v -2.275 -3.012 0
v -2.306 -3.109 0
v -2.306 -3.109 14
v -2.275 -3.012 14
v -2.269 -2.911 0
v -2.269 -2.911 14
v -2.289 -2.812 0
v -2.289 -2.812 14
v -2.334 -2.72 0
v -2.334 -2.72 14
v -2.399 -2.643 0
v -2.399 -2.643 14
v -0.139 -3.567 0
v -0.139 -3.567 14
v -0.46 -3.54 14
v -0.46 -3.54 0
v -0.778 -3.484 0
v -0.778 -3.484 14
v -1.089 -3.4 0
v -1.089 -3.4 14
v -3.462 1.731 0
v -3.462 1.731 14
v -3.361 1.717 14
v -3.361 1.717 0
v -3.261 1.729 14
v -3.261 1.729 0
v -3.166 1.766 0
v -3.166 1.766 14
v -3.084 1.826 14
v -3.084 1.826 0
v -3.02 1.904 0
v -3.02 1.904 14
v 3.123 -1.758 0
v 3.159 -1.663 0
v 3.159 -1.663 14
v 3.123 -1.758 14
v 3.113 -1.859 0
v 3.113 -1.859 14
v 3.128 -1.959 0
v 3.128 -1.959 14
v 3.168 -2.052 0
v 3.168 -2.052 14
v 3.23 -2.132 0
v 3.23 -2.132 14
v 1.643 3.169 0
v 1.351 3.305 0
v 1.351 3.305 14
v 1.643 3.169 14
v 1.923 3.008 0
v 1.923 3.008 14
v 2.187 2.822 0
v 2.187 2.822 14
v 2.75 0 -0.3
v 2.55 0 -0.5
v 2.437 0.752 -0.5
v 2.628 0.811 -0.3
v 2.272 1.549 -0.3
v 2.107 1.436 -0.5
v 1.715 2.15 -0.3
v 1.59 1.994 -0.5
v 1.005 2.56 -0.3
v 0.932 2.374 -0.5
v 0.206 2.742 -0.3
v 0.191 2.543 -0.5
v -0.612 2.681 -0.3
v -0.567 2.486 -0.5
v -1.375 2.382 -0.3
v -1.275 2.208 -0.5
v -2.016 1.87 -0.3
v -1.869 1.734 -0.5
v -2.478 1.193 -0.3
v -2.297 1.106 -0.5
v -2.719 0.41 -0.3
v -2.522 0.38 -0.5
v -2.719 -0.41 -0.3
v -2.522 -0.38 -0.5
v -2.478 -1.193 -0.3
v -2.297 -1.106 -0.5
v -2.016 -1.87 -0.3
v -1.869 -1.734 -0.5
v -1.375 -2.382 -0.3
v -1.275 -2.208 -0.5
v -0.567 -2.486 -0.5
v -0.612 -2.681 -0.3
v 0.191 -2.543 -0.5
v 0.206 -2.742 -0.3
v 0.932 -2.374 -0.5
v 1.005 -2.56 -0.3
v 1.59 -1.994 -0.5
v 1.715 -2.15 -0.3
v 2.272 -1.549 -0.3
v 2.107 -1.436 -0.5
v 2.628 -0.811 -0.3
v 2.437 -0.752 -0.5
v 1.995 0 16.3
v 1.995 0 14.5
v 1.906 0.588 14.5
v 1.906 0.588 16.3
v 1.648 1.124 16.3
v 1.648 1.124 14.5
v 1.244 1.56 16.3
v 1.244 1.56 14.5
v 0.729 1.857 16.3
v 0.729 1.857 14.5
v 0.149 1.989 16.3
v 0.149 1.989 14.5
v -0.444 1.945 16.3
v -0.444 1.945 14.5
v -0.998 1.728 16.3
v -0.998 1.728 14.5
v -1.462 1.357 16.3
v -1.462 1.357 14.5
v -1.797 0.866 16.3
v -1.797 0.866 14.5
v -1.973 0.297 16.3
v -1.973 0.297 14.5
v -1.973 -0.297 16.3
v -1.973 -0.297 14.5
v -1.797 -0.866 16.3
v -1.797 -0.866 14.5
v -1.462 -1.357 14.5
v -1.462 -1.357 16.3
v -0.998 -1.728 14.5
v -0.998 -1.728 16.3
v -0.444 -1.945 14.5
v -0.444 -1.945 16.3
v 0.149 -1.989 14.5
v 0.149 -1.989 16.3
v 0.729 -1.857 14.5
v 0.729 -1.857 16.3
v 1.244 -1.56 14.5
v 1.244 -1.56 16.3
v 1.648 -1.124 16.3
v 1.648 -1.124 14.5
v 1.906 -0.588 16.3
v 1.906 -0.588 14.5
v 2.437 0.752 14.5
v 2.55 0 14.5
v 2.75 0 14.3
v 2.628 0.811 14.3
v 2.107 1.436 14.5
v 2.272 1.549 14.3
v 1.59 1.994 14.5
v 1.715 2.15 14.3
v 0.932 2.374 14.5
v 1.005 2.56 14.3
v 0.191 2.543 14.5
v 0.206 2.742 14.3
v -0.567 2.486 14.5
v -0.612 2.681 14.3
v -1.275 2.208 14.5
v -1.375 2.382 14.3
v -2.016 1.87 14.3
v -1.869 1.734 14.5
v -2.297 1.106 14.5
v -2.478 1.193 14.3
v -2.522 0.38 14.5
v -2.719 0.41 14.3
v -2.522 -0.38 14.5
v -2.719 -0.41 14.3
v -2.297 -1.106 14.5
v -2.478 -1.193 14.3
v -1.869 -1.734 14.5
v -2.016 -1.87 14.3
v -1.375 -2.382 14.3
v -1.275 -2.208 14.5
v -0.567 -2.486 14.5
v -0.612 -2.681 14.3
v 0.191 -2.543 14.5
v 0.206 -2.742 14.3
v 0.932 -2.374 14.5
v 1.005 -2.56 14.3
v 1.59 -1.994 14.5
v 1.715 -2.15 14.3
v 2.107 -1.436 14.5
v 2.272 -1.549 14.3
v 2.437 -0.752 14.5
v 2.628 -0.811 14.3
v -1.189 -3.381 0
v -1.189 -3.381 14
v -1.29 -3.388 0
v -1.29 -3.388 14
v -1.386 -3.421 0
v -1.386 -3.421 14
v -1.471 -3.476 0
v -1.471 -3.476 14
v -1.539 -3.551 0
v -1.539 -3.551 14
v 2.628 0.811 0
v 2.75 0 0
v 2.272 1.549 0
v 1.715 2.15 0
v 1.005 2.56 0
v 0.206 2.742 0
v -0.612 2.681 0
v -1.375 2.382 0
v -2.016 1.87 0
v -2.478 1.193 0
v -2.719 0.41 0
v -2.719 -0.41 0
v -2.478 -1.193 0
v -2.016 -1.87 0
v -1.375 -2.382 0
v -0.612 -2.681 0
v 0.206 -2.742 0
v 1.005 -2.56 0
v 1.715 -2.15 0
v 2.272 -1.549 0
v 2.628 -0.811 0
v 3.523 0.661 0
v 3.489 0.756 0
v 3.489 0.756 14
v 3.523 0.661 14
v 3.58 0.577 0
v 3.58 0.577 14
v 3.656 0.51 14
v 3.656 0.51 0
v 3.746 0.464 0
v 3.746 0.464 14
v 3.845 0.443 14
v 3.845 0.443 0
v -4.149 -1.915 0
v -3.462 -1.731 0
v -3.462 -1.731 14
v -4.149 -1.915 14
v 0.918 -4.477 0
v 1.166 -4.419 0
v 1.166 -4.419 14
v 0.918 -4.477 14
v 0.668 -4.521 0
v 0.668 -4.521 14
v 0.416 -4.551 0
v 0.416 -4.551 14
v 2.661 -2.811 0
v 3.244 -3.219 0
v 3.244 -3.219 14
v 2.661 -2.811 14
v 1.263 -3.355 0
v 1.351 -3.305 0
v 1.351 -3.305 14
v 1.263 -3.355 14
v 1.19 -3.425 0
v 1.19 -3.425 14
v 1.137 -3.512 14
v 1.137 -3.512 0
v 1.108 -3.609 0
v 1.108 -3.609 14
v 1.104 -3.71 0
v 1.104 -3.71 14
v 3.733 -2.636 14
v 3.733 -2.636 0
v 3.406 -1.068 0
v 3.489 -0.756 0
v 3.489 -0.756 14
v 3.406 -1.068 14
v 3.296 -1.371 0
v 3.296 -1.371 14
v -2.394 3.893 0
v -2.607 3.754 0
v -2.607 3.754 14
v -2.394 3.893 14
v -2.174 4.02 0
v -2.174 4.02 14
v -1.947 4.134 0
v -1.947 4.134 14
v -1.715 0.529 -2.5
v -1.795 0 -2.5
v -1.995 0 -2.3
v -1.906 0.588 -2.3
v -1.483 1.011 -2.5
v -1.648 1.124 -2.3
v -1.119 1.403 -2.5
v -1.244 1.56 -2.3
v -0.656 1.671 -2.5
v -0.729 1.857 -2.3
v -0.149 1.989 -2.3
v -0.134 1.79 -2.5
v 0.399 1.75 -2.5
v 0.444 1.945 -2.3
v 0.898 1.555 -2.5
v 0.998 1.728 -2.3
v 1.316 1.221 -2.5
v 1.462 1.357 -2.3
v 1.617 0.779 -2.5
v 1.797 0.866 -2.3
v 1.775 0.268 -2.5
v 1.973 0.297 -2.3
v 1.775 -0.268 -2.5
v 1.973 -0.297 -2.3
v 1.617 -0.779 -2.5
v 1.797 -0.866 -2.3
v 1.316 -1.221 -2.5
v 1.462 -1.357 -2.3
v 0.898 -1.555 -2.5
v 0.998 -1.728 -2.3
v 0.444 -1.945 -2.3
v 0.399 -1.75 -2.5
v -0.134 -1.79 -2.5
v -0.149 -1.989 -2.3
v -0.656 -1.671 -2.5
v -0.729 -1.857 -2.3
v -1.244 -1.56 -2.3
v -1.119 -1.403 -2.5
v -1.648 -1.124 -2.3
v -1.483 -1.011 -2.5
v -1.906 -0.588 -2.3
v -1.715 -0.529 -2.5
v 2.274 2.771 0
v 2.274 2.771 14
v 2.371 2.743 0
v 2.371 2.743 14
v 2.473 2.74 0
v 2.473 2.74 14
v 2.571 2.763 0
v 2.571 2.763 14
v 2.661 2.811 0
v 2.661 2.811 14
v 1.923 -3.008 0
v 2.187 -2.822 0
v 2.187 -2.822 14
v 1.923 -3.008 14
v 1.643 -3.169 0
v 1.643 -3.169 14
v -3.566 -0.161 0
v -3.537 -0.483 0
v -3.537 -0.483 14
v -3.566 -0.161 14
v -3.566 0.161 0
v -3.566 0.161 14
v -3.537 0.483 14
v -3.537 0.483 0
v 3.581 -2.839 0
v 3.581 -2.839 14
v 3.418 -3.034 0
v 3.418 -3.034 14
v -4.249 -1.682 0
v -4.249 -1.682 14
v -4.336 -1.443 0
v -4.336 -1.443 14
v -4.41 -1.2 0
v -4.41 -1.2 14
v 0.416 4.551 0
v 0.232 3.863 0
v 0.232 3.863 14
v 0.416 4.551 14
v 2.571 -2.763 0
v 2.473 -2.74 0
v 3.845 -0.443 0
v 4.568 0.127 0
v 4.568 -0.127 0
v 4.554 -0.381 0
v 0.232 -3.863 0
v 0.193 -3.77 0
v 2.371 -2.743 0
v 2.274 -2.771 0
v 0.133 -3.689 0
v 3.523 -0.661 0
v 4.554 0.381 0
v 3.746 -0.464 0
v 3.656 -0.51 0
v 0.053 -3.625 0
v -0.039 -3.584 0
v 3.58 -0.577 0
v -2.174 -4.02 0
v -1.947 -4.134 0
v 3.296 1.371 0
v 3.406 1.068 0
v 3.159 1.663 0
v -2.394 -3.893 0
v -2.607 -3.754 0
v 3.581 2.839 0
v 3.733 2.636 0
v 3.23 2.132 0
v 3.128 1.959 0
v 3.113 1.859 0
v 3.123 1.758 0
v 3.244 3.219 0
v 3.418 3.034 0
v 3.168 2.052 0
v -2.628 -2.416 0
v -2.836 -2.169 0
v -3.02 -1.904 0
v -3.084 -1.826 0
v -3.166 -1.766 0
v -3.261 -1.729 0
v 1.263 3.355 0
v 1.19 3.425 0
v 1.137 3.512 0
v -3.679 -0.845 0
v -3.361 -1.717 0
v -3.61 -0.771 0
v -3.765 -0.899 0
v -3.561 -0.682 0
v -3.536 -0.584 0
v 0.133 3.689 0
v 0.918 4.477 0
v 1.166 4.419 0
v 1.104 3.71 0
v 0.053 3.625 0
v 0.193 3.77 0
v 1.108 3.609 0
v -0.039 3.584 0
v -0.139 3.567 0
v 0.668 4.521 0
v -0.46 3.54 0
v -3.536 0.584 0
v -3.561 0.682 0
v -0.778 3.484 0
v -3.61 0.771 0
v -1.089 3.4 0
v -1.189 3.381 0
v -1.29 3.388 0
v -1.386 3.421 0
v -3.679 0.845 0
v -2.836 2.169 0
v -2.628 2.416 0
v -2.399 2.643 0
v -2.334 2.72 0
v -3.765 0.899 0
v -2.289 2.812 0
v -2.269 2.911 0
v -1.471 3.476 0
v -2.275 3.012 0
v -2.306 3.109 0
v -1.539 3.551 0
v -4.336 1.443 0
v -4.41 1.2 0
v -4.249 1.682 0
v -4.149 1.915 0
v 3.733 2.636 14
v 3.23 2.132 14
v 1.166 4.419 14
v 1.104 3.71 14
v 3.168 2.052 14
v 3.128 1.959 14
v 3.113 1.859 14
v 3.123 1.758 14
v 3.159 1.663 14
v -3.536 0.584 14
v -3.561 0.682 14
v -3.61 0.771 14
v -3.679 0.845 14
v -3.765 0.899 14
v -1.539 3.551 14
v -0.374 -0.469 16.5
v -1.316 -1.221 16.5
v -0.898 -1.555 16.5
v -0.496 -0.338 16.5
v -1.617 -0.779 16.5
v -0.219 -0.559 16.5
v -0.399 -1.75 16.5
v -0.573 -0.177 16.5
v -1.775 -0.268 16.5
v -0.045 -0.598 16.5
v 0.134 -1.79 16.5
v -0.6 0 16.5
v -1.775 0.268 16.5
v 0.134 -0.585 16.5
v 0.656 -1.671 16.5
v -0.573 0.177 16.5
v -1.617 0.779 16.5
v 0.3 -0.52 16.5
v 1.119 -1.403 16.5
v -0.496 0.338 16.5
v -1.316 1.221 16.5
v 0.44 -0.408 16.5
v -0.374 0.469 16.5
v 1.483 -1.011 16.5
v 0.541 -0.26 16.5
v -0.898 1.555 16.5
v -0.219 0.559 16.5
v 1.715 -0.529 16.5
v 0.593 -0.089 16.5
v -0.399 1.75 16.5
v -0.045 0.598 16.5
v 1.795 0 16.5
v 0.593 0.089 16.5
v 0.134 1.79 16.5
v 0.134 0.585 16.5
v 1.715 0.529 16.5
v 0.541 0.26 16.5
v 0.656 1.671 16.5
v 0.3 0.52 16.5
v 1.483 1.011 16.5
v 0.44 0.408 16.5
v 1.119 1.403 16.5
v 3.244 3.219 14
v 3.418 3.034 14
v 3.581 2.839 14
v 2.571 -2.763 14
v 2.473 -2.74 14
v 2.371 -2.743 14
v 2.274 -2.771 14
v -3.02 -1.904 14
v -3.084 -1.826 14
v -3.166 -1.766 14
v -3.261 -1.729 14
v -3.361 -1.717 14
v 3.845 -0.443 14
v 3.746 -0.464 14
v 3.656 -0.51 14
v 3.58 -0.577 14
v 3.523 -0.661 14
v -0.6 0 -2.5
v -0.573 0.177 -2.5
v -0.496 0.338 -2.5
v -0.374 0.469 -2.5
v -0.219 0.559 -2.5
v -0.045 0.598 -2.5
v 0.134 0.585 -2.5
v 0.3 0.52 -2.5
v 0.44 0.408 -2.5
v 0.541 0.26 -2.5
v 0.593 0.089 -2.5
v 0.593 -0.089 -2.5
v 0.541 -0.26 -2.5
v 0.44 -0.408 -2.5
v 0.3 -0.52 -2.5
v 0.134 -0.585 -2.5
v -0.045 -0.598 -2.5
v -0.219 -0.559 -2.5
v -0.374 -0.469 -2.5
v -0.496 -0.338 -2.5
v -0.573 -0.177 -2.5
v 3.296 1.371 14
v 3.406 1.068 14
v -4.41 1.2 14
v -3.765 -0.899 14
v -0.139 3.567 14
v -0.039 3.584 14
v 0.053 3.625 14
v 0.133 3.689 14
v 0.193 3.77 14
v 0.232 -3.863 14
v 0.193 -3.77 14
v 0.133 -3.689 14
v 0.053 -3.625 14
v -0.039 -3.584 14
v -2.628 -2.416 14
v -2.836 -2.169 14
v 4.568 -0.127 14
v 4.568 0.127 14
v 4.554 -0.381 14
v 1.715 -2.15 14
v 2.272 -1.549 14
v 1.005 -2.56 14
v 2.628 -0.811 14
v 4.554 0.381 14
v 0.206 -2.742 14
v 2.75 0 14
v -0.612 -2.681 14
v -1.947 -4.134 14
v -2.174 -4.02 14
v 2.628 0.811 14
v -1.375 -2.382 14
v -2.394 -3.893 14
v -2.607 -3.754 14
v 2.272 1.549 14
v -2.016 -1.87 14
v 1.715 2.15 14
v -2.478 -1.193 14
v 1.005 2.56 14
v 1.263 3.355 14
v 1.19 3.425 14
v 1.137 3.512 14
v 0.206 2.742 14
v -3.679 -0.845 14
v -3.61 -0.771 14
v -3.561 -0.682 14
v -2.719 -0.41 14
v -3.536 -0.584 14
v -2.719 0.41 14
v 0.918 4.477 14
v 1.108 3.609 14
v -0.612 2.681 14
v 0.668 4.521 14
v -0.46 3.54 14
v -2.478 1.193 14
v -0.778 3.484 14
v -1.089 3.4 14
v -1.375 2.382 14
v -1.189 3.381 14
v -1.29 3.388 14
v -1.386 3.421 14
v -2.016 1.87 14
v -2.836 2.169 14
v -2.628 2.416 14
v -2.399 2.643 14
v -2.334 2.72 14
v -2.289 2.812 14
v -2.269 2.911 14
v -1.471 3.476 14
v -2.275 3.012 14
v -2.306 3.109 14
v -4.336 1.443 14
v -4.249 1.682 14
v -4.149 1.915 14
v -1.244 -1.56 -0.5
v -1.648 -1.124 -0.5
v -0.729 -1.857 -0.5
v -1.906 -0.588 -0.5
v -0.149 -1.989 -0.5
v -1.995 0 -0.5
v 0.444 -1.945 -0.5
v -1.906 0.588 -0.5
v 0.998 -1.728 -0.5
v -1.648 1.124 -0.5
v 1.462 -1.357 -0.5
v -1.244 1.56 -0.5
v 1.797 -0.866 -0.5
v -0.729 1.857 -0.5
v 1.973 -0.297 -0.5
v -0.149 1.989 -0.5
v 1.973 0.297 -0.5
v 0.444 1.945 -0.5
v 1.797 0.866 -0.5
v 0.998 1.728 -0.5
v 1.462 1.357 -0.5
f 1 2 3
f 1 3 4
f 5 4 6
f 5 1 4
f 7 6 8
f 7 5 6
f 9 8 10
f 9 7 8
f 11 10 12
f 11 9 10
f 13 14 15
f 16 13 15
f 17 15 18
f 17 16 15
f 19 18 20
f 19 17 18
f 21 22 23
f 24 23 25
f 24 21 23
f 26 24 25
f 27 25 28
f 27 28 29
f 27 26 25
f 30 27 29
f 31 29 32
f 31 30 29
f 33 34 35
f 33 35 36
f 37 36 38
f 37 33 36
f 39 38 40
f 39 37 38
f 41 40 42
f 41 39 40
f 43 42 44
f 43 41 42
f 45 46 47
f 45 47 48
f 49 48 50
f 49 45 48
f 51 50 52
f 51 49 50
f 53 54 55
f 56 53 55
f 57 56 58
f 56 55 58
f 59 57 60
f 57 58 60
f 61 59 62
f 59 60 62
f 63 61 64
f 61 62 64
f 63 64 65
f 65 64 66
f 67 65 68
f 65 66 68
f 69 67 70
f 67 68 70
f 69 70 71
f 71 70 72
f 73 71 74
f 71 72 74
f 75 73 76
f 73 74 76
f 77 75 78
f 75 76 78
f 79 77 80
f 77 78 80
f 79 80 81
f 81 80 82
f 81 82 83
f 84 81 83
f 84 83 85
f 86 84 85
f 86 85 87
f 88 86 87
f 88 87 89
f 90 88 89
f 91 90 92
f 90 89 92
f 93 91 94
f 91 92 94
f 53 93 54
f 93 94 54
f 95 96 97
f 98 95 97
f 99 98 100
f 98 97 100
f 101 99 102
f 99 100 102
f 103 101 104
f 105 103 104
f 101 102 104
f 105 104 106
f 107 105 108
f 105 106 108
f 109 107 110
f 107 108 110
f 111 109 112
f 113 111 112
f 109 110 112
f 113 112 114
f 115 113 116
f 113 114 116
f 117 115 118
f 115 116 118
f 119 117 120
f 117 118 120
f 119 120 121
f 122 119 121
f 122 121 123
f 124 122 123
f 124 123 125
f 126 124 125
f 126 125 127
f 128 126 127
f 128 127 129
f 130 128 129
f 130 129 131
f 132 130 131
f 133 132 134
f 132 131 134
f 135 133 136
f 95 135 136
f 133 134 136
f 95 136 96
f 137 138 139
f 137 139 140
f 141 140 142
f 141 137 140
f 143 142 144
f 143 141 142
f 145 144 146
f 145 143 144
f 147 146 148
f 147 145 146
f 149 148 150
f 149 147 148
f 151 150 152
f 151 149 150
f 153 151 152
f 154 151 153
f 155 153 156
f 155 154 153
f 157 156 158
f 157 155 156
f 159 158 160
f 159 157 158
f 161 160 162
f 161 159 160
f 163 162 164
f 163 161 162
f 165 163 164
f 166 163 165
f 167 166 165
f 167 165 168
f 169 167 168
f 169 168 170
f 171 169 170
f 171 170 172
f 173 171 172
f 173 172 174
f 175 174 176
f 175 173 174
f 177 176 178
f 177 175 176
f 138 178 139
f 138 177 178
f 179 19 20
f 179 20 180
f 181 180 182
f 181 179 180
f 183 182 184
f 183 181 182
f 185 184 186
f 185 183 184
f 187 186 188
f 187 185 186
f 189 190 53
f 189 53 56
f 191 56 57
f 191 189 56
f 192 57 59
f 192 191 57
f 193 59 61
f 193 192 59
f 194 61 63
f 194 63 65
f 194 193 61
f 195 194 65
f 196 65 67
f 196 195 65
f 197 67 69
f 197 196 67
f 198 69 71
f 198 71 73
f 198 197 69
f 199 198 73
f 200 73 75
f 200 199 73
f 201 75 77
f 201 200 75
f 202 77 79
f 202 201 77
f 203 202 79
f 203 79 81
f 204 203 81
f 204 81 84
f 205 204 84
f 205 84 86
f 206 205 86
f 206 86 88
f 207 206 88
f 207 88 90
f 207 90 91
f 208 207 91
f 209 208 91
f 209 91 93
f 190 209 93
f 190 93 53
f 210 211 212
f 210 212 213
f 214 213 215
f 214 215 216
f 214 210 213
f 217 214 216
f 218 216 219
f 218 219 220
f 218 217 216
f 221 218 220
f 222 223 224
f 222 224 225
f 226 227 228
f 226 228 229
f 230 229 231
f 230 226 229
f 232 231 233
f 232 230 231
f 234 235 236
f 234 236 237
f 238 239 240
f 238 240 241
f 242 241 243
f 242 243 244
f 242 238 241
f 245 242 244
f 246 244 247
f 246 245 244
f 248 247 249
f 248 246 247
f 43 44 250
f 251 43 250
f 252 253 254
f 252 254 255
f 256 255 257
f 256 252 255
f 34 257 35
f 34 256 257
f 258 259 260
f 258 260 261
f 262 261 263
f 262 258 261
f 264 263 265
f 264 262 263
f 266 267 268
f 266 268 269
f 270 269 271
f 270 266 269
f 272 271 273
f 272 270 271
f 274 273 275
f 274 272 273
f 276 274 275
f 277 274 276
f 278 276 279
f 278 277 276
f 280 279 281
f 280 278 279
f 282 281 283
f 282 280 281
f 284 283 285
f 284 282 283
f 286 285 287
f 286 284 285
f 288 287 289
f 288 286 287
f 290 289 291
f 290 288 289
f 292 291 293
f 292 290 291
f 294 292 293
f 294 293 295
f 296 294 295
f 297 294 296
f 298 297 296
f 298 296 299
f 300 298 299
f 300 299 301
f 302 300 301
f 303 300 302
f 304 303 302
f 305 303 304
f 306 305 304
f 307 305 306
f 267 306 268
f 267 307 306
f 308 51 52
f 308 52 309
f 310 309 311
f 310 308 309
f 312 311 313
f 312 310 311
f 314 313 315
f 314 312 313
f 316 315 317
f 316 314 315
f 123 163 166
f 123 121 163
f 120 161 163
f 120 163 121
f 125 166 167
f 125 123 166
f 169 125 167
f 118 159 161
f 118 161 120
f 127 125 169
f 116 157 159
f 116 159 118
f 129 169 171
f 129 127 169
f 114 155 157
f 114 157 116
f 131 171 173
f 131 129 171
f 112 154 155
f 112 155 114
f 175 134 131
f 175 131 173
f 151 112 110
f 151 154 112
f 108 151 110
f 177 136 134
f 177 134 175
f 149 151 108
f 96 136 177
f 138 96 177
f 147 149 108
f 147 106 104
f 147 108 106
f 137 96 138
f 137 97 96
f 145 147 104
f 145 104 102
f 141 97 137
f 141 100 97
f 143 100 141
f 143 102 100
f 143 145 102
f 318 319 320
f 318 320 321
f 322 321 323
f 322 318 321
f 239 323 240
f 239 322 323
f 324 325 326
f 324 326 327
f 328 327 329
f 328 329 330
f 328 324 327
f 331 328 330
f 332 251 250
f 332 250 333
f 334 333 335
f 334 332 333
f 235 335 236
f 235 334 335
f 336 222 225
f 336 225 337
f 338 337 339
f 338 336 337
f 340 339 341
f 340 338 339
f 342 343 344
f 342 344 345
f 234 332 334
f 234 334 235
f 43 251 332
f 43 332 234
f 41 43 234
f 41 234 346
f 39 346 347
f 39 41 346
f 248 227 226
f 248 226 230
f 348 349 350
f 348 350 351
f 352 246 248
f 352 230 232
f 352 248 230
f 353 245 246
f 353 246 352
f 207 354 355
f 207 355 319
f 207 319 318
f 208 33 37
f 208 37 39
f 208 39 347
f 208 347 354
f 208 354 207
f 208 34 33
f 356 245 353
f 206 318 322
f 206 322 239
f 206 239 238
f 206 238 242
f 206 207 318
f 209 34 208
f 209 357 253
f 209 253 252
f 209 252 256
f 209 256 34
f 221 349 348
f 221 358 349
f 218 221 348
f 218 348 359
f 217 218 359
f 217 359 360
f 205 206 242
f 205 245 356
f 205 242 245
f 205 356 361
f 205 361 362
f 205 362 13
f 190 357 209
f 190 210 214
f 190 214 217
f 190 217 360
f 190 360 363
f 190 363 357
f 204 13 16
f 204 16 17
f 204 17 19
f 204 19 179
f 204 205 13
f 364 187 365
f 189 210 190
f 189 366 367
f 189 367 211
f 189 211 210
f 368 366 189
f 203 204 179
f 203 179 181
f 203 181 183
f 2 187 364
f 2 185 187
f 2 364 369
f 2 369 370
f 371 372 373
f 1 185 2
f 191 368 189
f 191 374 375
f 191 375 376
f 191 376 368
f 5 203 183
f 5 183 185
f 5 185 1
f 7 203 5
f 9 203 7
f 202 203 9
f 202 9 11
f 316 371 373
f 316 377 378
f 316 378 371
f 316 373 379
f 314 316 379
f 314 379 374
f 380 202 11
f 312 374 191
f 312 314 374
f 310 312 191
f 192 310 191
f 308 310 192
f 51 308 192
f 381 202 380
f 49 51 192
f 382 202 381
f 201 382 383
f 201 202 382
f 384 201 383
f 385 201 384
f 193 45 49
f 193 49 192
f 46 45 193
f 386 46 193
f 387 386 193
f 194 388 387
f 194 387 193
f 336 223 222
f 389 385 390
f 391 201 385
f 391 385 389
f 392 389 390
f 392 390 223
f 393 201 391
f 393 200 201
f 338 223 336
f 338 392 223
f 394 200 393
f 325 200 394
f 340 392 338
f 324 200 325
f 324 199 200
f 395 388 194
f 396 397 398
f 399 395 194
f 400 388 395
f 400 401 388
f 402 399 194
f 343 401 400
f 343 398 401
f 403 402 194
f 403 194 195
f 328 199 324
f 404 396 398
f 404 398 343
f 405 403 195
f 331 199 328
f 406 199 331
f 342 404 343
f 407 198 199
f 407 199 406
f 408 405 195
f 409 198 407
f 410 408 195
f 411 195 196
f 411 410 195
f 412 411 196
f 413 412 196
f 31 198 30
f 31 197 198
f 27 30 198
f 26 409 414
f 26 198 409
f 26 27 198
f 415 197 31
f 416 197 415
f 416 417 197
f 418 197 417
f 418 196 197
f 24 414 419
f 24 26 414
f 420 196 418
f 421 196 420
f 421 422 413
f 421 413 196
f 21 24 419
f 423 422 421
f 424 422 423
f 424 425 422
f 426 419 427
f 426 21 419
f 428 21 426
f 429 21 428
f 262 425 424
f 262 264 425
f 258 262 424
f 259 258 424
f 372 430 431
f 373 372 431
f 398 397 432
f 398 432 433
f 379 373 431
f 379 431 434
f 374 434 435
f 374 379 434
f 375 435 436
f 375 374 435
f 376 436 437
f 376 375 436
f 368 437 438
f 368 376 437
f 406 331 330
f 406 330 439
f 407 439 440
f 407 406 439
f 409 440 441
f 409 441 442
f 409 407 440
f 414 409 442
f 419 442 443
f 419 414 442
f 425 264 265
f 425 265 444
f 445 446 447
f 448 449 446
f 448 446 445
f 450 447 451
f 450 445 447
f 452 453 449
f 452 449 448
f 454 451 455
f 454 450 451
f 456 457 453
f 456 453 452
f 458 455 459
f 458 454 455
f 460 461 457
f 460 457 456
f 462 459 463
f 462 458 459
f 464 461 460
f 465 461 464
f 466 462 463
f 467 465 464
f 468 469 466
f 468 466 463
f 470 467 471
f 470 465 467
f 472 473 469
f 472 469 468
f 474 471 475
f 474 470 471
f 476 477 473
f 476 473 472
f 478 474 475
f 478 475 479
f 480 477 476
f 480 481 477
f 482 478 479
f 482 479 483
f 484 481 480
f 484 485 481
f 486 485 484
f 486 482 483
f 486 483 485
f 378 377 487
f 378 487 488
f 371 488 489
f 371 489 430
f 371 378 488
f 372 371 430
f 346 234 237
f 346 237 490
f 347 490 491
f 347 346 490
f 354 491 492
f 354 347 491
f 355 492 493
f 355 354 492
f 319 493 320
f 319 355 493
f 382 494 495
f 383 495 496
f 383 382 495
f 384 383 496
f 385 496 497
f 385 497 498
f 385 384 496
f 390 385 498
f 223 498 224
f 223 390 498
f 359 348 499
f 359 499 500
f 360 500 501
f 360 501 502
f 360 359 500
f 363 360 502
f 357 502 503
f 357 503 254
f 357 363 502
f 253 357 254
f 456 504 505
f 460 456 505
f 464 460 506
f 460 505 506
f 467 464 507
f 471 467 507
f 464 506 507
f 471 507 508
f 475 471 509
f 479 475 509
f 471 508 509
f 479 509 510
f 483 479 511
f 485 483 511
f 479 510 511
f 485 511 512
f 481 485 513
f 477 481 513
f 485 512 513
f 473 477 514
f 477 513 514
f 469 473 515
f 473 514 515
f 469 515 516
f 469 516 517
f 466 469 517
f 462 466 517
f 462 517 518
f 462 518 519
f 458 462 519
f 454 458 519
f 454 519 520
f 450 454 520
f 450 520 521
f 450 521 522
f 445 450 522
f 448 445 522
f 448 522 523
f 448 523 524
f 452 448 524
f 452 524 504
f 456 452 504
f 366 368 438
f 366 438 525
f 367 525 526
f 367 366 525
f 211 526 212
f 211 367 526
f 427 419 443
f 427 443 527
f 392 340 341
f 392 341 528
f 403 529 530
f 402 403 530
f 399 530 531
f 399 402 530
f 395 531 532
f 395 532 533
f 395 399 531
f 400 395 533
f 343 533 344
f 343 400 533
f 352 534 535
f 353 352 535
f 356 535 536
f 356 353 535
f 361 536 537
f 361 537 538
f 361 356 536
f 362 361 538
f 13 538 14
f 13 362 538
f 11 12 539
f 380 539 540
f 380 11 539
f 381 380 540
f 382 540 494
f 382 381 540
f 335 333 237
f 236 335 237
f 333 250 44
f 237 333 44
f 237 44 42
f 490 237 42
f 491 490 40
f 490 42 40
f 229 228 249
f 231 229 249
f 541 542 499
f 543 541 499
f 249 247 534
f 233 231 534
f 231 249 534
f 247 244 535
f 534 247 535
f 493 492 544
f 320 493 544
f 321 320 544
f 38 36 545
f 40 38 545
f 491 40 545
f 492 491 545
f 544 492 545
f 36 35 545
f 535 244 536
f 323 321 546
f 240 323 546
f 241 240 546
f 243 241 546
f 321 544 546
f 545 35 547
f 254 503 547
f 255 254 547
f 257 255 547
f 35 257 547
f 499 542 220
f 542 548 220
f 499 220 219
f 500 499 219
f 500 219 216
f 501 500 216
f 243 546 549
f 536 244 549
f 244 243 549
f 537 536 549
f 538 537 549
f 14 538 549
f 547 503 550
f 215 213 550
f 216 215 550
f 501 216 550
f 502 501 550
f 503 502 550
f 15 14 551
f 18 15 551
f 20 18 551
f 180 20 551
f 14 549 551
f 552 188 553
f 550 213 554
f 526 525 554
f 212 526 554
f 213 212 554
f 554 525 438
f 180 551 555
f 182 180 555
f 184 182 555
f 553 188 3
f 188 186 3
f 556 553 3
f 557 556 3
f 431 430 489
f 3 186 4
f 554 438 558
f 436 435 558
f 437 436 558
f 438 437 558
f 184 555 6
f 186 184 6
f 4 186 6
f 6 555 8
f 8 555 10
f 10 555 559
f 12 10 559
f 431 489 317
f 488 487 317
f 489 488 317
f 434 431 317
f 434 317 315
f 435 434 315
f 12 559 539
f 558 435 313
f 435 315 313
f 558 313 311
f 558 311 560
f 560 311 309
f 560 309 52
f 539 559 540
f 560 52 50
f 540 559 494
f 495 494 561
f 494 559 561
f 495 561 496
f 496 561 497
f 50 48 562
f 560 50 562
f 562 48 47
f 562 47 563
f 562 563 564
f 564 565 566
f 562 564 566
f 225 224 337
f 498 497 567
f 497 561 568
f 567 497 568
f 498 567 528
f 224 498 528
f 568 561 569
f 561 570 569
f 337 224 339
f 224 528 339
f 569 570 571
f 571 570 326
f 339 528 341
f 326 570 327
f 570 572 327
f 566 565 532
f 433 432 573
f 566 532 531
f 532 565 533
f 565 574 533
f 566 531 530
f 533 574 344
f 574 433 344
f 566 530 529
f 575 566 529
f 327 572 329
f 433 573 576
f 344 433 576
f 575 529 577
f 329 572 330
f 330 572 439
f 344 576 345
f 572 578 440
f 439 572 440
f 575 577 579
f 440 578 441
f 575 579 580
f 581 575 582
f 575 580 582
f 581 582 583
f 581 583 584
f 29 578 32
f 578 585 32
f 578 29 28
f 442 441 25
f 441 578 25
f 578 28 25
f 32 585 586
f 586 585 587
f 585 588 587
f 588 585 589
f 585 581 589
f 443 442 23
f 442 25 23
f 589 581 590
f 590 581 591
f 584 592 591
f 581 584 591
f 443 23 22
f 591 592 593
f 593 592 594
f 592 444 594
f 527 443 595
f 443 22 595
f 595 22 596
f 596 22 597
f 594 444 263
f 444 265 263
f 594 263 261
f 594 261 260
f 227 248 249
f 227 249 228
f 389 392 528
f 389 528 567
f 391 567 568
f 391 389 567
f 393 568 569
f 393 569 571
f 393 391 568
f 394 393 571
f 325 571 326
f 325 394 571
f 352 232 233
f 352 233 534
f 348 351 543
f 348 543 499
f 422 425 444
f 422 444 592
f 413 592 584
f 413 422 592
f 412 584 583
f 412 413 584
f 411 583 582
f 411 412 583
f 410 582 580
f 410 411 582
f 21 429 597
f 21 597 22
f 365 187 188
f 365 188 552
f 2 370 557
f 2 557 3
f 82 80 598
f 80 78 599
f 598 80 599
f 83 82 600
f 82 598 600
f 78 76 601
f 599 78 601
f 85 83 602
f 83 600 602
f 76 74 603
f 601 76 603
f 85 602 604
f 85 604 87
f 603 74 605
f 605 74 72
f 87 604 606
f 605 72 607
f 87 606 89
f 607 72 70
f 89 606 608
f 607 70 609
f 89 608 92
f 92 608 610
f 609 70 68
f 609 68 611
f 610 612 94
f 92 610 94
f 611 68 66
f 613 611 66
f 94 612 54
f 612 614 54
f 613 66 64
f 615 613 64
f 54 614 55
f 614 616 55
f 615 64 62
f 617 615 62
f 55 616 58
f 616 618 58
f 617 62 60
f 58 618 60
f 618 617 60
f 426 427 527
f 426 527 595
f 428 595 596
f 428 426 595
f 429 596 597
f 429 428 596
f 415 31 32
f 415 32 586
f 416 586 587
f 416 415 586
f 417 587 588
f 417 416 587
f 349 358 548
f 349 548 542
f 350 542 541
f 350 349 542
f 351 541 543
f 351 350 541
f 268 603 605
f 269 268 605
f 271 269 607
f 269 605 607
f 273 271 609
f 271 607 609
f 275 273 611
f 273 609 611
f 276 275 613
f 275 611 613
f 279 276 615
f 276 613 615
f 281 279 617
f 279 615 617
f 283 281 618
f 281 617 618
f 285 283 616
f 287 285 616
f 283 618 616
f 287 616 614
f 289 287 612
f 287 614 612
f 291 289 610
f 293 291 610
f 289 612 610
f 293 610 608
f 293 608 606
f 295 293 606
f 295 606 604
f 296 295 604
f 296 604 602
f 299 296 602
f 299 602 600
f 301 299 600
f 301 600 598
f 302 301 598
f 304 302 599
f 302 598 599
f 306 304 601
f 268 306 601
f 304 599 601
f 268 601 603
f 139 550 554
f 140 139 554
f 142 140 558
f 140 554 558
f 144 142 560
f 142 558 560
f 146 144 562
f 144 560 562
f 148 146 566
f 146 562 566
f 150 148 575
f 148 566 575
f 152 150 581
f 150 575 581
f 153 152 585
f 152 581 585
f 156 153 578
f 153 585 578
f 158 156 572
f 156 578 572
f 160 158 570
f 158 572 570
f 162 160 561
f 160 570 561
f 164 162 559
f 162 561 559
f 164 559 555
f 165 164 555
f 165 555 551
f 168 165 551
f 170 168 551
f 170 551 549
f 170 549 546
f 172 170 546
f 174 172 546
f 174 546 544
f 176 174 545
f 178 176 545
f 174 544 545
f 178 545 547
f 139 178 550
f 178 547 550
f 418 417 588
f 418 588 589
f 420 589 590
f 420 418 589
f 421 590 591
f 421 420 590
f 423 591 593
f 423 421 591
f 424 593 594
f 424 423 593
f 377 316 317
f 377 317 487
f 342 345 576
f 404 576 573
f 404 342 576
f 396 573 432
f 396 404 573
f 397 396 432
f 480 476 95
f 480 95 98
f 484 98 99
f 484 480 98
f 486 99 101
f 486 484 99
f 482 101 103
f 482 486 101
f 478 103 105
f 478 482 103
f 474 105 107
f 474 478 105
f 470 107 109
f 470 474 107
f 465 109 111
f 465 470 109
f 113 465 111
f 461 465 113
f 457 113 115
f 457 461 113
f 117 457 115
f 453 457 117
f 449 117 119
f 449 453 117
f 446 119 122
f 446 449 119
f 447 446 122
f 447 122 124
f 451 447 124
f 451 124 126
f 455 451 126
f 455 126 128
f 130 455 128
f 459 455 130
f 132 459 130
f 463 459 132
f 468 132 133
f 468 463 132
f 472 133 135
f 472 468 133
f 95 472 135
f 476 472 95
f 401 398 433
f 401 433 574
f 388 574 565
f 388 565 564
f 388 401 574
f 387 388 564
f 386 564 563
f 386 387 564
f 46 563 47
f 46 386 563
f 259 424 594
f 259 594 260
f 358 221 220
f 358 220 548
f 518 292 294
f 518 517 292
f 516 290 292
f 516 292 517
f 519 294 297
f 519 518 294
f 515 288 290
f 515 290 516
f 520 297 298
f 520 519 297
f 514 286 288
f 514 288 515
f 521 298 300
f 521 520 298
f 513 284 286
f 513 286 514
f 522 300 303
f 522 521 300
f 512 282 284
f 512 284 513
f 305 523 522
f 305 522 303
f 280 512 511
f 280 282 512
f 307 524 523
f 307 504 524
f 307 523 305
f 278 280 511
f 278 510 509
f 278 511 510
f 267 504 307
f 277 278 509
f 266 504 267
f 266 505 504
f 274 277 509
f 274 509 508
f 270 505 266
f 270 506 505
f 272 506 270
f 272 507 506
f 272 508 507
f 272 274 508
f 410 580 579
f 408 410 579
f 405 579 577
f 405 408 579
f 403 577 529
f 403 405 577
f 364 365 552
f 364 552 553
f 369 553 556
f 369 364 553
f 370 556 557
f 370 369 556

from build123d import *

# Parameters (mm, degrees)
SKETCH2_R           = 2
BOSS_EXTRUDE1_DEPTH = 14
SKETCH3_R           = 2.75
BOSS_EXTRUDE2_DEPTH = 14.5
SKETCH4_R           = 2.75
BOSS_EXTRUDE3_DEPTH = 0.5
SKETCH5_R           = 1.995
BOSS_EXTRUDE4_DEPTH = 2
SKETCH6_R           = 1.995
BOSS_EXTRUDE5_DEPTH = 2
SKETCH7_R           = 0.6
CUT_EXTRUDE1_DEPTH  = 21
CHAMFER1_SIZE       = 0.2


with BuildPart() as part:
    # Sketch2 → Boss-Extrude1 (new body)
    with BuildSketch(Plane.XY):
        with BuildLine():
            Line((-4.409637173, -1.2), (-3.764514138, -0.899174188))
            ThreePointArc((-3.764514138, -0.899174188), (-3.582420347, -0.728223333), (-3.537232834, -0.482580436))
            ThreePointArc((-3.537232834, -0.482580436), (-3.57, 0), (-3.537232834, 0.482580436))
            ThreePointArc((-3.537232834, 0.482580436), (-3.582420347, 0.728223333), (-3.764514138, 0.899174188))
            Line((-3.764514138, 0.899174188), (-4.409637173, 1.2))
            ThreePointArc((-4.409637173, 1.2), (-4.294395277, 1.563032055), (-4.149323184, 1.915206806))
            Line((-4.149323184, 1.915206806), (-3.461763164, 1.730975654))
            ThreePointArc((-3.461763164, 1.730975654), (-3.212386135, 1.744883974), (-3.019874282, 1.904011377))
            ThreePointArc((-3.019874282, 1.904011377), (-2.734778662, 2.294751767), (-2.399480831, 2.6433675))
            ThreePointArc((-2.399480831, 2.6433675), (-2.276200264, 2.860586849), (-2.305807109, 3.108590435))
            Line((-2.305807109, 3.108590435), (-2.606632921, 3.75371347))
            ThreePointArc((-2.606632921, 3.75371347), (-2.285, 3.957736095), (-1.947494763, 4.134267063))
            Line((-1.947494763, 4.134267063), (-1.539214732, 3.55118275))
            ThreePointArc((-1.539214732, 3.55118275), (-1.339240749, 3.401540677), (-1.089482991, 3.399695106))
            ThreePointArc((-1.089482991, 3.399695106), (-0.619923994, 3.515763678), (-0.13898508, 3.567293533))
            ThreePointArc((-0.13898508, 3.567293533), (0.095079219, 3.654449987), (0.231812692, 3.863462669))
            Line((0.231812692, 3.863462669), (0.416043844, 4.551022689))
            ThreePointArc((0.416043844, 4.551022689), (0.793572172, 4.500571431), (1.165588102, 4.418857814))
            Line((1.165588102, 4.418857814), (1.10354938, 3.709751971))
            ThreePointArc((1.10354938, 3.709751971), (1.160550267, 3.466578694), (1.3506895, 3.304623712))
            ThreePointArc((1.3506895, 3.304623712), (1.785, 3.091710692), (2.186543334, 2.822043275))
            ThreePointArc((2.186543334, 2.822043275), (2.421870079, 2.738355361), (2.660964759, 2.810577782))
            Line((2.660964759, 2.810577782), (3.244049071, 3.218857814))
            ThreePointArc((3.244049071, 3.218857814), (3.500823105, 2.937539376), (3.73327934, 2.635815883))
            Line((3.73327934, 2.635815883), (3.229950472, 2.132487015))
            ThreePointArc((3.229950472, 2.132487015), (3.117306916, 1.909566013), (3.158859362, 1.663282156))
            ThreePointArc((3.158859362, 1.663282156), (3.354702656, 1.221011912), (3.488963822, 0.756327606))
            ThreePointArc((3.488963822, 0.756327606), (3.615441013, 0.540953828), (3.845021841, 0.442592316))
            Line((3.845021841, 0.442592316), (4.554127684, 0.380553593))
            ThreePointArc((4.554127684, 0.380553593), (4.57, 0), (4.554127684, -0.380553593))
            Line((4.554127684, -0.380553593), (3.845021841, -0.442592316))
            ThreePointArc((3.845021841, -0.442592316), (3.615441013, -0.540953828), (3.488963822, -0.756327606))
            ThreePointArc((3.488963822, -0.756327606), (3.354702656, -1.221011912), (3.158859362, -1.663282156))
            ThreePointArc((3.158859362, -1.663282156), (3.117306916, -1.909566013), (3.229950472, -2.132487015))
            Line((3.229950472, -2.132487015), (3.73327934, -2.635815883))
            ThreePointArc((3.73327934, -2.635815883), (3.500823105, -2.937539376), (3.244049071, -3.218857814))
            Line((3.244049071, -3.218857814), (2.660964759, -2.810577782))
            ThreePointArc((2.660964759, -2.810577782), (2.421870079, -2.738355361), (2.186543334, -2.822043275))
            ThreePointArc((2.186543334, -2.822043275), (1.785, -3.091710692), (1.3506895, -3.304623712))
            ThreePointArc((1.3506895, -3.304623712), (1.160550267, -3.466578694), (1.10354938, -3.709751971))
            Line((1.10354938, -3.709751971), (1.165588102, -4.418857814))
            ThreePointArc((1.165588102, -4.418857814), (0.793572172, -4.500571431), (0.416043844, -4.551022689))
            Line((0.416043844, -4.551022689), (0.231812692, -3.863462669))
            ThreePointArc((0.231812692, -3.863462669), (0.095079219, -3.654449987), (-0.13898508, -3.567293533))
            ThreePointArc((-0.13898508, -3.567293533), (-0.619923994, -3.515763678), (-1.089482991, -3.399695106))
            ThreePointArc((-1.089482991, -3.399695106), (-1.339240749, -3.401540677), (-1.539214732, -3.55118275))
            Line((-1.539214732, -3.55118275), (-1.947494763, -4.134267063))
            ThreePointArc((-1.947494763, -4.134267063), (-2.285, -3.957736095), (-2.606632921, -3.75371347))
            Line((-2.606632921, -3.75371347), (-2.305807109, -3.108590435))
            ThreePointArc((-2.305807109, -3.108590435), (-2.276200264, -2.860586849), (-2.399480831, -2.6433675))
            ThreePointArc((-2.399480831, -2.6433675), (-2.734778662, -2.294751767), (-3.019874282, -1.904011377))
            ThreePointArc((-3.019874282, -1.904011377), (-3.212386135, -1.744883974), (-3.461763164, -1.730975654))
            Line((-3.461763164, -1.730975654), (-4.149323184, -1.915206806))
            ThreePointArc((-4.149323184, -1.915206806), (-4.294395277, -1.563032055), (-4.409637173, -1.2))
        make_face()
        Circle(SKETCH2_R, mode=Mode.SUBTRACT)
    extrude(amount=BOSS_EXTRUDE1_DEPTH)

    # Sketch3 → Boss-Extrude2 (add)
    with BuildSketch(Plane.XY.offset(14)):
        Circle(SKETCH3_R)
    extrude(amount=-BOSS_EXTRUDE2_DEPTH)

    # Sketch4 → Boss-Extrude3 (add)
    with BuildSketch(Plane.XY.offset(14)):
        Circle(SKETCH4_R)
    extrude(amount=BOSS_EXTRUDE3_DEPTH)

    # Sketch5 → Boss-Extrude4 (add)
    with BuildSketch(Plane.XY.offset(14.5)):
        Circle(SKETCH5_R)
    extrude(amount=BOSS_EXTRUDE4_DEPTH)

    # Sketch6 → Boss-Extrude5 (add)
    with BuildSketch(Plane(origin=(0, 0, -0.5), x_dir=(-1, 0, 0), z_dir=(0, 0, -1))):
        Circle(SKETCH6_R)
    extrude(amount=BOSS_EXTRUDE5_DEPTH)

    # Sketch7 → Cut-Extrude1 (cut)
    with BuildSketch(Plane(origin=(0, 0, -2.5), x_dir=(-1, 0, 0), z_dir=(0, 0, -1))):
        Circle(SKETCH7_R)
    extrude(amount=-CUT_EXTRUDE1_DEPTH, mode=Mode.SUBTRACT)

    # Chamfer1
    chamfer1_edges = [part.edges().sort_by_distance(p)[0] for p in [
        (-2.75, 0, -0.5),
        (-2.75, 0, 14.5),
        (-1.995, 0, 16.5),
        (1.995, 0, -2.5),
    ]]
    chamfer(chamfer1_edges, length=CHAMFER1_SIZE)


solid = part.part
